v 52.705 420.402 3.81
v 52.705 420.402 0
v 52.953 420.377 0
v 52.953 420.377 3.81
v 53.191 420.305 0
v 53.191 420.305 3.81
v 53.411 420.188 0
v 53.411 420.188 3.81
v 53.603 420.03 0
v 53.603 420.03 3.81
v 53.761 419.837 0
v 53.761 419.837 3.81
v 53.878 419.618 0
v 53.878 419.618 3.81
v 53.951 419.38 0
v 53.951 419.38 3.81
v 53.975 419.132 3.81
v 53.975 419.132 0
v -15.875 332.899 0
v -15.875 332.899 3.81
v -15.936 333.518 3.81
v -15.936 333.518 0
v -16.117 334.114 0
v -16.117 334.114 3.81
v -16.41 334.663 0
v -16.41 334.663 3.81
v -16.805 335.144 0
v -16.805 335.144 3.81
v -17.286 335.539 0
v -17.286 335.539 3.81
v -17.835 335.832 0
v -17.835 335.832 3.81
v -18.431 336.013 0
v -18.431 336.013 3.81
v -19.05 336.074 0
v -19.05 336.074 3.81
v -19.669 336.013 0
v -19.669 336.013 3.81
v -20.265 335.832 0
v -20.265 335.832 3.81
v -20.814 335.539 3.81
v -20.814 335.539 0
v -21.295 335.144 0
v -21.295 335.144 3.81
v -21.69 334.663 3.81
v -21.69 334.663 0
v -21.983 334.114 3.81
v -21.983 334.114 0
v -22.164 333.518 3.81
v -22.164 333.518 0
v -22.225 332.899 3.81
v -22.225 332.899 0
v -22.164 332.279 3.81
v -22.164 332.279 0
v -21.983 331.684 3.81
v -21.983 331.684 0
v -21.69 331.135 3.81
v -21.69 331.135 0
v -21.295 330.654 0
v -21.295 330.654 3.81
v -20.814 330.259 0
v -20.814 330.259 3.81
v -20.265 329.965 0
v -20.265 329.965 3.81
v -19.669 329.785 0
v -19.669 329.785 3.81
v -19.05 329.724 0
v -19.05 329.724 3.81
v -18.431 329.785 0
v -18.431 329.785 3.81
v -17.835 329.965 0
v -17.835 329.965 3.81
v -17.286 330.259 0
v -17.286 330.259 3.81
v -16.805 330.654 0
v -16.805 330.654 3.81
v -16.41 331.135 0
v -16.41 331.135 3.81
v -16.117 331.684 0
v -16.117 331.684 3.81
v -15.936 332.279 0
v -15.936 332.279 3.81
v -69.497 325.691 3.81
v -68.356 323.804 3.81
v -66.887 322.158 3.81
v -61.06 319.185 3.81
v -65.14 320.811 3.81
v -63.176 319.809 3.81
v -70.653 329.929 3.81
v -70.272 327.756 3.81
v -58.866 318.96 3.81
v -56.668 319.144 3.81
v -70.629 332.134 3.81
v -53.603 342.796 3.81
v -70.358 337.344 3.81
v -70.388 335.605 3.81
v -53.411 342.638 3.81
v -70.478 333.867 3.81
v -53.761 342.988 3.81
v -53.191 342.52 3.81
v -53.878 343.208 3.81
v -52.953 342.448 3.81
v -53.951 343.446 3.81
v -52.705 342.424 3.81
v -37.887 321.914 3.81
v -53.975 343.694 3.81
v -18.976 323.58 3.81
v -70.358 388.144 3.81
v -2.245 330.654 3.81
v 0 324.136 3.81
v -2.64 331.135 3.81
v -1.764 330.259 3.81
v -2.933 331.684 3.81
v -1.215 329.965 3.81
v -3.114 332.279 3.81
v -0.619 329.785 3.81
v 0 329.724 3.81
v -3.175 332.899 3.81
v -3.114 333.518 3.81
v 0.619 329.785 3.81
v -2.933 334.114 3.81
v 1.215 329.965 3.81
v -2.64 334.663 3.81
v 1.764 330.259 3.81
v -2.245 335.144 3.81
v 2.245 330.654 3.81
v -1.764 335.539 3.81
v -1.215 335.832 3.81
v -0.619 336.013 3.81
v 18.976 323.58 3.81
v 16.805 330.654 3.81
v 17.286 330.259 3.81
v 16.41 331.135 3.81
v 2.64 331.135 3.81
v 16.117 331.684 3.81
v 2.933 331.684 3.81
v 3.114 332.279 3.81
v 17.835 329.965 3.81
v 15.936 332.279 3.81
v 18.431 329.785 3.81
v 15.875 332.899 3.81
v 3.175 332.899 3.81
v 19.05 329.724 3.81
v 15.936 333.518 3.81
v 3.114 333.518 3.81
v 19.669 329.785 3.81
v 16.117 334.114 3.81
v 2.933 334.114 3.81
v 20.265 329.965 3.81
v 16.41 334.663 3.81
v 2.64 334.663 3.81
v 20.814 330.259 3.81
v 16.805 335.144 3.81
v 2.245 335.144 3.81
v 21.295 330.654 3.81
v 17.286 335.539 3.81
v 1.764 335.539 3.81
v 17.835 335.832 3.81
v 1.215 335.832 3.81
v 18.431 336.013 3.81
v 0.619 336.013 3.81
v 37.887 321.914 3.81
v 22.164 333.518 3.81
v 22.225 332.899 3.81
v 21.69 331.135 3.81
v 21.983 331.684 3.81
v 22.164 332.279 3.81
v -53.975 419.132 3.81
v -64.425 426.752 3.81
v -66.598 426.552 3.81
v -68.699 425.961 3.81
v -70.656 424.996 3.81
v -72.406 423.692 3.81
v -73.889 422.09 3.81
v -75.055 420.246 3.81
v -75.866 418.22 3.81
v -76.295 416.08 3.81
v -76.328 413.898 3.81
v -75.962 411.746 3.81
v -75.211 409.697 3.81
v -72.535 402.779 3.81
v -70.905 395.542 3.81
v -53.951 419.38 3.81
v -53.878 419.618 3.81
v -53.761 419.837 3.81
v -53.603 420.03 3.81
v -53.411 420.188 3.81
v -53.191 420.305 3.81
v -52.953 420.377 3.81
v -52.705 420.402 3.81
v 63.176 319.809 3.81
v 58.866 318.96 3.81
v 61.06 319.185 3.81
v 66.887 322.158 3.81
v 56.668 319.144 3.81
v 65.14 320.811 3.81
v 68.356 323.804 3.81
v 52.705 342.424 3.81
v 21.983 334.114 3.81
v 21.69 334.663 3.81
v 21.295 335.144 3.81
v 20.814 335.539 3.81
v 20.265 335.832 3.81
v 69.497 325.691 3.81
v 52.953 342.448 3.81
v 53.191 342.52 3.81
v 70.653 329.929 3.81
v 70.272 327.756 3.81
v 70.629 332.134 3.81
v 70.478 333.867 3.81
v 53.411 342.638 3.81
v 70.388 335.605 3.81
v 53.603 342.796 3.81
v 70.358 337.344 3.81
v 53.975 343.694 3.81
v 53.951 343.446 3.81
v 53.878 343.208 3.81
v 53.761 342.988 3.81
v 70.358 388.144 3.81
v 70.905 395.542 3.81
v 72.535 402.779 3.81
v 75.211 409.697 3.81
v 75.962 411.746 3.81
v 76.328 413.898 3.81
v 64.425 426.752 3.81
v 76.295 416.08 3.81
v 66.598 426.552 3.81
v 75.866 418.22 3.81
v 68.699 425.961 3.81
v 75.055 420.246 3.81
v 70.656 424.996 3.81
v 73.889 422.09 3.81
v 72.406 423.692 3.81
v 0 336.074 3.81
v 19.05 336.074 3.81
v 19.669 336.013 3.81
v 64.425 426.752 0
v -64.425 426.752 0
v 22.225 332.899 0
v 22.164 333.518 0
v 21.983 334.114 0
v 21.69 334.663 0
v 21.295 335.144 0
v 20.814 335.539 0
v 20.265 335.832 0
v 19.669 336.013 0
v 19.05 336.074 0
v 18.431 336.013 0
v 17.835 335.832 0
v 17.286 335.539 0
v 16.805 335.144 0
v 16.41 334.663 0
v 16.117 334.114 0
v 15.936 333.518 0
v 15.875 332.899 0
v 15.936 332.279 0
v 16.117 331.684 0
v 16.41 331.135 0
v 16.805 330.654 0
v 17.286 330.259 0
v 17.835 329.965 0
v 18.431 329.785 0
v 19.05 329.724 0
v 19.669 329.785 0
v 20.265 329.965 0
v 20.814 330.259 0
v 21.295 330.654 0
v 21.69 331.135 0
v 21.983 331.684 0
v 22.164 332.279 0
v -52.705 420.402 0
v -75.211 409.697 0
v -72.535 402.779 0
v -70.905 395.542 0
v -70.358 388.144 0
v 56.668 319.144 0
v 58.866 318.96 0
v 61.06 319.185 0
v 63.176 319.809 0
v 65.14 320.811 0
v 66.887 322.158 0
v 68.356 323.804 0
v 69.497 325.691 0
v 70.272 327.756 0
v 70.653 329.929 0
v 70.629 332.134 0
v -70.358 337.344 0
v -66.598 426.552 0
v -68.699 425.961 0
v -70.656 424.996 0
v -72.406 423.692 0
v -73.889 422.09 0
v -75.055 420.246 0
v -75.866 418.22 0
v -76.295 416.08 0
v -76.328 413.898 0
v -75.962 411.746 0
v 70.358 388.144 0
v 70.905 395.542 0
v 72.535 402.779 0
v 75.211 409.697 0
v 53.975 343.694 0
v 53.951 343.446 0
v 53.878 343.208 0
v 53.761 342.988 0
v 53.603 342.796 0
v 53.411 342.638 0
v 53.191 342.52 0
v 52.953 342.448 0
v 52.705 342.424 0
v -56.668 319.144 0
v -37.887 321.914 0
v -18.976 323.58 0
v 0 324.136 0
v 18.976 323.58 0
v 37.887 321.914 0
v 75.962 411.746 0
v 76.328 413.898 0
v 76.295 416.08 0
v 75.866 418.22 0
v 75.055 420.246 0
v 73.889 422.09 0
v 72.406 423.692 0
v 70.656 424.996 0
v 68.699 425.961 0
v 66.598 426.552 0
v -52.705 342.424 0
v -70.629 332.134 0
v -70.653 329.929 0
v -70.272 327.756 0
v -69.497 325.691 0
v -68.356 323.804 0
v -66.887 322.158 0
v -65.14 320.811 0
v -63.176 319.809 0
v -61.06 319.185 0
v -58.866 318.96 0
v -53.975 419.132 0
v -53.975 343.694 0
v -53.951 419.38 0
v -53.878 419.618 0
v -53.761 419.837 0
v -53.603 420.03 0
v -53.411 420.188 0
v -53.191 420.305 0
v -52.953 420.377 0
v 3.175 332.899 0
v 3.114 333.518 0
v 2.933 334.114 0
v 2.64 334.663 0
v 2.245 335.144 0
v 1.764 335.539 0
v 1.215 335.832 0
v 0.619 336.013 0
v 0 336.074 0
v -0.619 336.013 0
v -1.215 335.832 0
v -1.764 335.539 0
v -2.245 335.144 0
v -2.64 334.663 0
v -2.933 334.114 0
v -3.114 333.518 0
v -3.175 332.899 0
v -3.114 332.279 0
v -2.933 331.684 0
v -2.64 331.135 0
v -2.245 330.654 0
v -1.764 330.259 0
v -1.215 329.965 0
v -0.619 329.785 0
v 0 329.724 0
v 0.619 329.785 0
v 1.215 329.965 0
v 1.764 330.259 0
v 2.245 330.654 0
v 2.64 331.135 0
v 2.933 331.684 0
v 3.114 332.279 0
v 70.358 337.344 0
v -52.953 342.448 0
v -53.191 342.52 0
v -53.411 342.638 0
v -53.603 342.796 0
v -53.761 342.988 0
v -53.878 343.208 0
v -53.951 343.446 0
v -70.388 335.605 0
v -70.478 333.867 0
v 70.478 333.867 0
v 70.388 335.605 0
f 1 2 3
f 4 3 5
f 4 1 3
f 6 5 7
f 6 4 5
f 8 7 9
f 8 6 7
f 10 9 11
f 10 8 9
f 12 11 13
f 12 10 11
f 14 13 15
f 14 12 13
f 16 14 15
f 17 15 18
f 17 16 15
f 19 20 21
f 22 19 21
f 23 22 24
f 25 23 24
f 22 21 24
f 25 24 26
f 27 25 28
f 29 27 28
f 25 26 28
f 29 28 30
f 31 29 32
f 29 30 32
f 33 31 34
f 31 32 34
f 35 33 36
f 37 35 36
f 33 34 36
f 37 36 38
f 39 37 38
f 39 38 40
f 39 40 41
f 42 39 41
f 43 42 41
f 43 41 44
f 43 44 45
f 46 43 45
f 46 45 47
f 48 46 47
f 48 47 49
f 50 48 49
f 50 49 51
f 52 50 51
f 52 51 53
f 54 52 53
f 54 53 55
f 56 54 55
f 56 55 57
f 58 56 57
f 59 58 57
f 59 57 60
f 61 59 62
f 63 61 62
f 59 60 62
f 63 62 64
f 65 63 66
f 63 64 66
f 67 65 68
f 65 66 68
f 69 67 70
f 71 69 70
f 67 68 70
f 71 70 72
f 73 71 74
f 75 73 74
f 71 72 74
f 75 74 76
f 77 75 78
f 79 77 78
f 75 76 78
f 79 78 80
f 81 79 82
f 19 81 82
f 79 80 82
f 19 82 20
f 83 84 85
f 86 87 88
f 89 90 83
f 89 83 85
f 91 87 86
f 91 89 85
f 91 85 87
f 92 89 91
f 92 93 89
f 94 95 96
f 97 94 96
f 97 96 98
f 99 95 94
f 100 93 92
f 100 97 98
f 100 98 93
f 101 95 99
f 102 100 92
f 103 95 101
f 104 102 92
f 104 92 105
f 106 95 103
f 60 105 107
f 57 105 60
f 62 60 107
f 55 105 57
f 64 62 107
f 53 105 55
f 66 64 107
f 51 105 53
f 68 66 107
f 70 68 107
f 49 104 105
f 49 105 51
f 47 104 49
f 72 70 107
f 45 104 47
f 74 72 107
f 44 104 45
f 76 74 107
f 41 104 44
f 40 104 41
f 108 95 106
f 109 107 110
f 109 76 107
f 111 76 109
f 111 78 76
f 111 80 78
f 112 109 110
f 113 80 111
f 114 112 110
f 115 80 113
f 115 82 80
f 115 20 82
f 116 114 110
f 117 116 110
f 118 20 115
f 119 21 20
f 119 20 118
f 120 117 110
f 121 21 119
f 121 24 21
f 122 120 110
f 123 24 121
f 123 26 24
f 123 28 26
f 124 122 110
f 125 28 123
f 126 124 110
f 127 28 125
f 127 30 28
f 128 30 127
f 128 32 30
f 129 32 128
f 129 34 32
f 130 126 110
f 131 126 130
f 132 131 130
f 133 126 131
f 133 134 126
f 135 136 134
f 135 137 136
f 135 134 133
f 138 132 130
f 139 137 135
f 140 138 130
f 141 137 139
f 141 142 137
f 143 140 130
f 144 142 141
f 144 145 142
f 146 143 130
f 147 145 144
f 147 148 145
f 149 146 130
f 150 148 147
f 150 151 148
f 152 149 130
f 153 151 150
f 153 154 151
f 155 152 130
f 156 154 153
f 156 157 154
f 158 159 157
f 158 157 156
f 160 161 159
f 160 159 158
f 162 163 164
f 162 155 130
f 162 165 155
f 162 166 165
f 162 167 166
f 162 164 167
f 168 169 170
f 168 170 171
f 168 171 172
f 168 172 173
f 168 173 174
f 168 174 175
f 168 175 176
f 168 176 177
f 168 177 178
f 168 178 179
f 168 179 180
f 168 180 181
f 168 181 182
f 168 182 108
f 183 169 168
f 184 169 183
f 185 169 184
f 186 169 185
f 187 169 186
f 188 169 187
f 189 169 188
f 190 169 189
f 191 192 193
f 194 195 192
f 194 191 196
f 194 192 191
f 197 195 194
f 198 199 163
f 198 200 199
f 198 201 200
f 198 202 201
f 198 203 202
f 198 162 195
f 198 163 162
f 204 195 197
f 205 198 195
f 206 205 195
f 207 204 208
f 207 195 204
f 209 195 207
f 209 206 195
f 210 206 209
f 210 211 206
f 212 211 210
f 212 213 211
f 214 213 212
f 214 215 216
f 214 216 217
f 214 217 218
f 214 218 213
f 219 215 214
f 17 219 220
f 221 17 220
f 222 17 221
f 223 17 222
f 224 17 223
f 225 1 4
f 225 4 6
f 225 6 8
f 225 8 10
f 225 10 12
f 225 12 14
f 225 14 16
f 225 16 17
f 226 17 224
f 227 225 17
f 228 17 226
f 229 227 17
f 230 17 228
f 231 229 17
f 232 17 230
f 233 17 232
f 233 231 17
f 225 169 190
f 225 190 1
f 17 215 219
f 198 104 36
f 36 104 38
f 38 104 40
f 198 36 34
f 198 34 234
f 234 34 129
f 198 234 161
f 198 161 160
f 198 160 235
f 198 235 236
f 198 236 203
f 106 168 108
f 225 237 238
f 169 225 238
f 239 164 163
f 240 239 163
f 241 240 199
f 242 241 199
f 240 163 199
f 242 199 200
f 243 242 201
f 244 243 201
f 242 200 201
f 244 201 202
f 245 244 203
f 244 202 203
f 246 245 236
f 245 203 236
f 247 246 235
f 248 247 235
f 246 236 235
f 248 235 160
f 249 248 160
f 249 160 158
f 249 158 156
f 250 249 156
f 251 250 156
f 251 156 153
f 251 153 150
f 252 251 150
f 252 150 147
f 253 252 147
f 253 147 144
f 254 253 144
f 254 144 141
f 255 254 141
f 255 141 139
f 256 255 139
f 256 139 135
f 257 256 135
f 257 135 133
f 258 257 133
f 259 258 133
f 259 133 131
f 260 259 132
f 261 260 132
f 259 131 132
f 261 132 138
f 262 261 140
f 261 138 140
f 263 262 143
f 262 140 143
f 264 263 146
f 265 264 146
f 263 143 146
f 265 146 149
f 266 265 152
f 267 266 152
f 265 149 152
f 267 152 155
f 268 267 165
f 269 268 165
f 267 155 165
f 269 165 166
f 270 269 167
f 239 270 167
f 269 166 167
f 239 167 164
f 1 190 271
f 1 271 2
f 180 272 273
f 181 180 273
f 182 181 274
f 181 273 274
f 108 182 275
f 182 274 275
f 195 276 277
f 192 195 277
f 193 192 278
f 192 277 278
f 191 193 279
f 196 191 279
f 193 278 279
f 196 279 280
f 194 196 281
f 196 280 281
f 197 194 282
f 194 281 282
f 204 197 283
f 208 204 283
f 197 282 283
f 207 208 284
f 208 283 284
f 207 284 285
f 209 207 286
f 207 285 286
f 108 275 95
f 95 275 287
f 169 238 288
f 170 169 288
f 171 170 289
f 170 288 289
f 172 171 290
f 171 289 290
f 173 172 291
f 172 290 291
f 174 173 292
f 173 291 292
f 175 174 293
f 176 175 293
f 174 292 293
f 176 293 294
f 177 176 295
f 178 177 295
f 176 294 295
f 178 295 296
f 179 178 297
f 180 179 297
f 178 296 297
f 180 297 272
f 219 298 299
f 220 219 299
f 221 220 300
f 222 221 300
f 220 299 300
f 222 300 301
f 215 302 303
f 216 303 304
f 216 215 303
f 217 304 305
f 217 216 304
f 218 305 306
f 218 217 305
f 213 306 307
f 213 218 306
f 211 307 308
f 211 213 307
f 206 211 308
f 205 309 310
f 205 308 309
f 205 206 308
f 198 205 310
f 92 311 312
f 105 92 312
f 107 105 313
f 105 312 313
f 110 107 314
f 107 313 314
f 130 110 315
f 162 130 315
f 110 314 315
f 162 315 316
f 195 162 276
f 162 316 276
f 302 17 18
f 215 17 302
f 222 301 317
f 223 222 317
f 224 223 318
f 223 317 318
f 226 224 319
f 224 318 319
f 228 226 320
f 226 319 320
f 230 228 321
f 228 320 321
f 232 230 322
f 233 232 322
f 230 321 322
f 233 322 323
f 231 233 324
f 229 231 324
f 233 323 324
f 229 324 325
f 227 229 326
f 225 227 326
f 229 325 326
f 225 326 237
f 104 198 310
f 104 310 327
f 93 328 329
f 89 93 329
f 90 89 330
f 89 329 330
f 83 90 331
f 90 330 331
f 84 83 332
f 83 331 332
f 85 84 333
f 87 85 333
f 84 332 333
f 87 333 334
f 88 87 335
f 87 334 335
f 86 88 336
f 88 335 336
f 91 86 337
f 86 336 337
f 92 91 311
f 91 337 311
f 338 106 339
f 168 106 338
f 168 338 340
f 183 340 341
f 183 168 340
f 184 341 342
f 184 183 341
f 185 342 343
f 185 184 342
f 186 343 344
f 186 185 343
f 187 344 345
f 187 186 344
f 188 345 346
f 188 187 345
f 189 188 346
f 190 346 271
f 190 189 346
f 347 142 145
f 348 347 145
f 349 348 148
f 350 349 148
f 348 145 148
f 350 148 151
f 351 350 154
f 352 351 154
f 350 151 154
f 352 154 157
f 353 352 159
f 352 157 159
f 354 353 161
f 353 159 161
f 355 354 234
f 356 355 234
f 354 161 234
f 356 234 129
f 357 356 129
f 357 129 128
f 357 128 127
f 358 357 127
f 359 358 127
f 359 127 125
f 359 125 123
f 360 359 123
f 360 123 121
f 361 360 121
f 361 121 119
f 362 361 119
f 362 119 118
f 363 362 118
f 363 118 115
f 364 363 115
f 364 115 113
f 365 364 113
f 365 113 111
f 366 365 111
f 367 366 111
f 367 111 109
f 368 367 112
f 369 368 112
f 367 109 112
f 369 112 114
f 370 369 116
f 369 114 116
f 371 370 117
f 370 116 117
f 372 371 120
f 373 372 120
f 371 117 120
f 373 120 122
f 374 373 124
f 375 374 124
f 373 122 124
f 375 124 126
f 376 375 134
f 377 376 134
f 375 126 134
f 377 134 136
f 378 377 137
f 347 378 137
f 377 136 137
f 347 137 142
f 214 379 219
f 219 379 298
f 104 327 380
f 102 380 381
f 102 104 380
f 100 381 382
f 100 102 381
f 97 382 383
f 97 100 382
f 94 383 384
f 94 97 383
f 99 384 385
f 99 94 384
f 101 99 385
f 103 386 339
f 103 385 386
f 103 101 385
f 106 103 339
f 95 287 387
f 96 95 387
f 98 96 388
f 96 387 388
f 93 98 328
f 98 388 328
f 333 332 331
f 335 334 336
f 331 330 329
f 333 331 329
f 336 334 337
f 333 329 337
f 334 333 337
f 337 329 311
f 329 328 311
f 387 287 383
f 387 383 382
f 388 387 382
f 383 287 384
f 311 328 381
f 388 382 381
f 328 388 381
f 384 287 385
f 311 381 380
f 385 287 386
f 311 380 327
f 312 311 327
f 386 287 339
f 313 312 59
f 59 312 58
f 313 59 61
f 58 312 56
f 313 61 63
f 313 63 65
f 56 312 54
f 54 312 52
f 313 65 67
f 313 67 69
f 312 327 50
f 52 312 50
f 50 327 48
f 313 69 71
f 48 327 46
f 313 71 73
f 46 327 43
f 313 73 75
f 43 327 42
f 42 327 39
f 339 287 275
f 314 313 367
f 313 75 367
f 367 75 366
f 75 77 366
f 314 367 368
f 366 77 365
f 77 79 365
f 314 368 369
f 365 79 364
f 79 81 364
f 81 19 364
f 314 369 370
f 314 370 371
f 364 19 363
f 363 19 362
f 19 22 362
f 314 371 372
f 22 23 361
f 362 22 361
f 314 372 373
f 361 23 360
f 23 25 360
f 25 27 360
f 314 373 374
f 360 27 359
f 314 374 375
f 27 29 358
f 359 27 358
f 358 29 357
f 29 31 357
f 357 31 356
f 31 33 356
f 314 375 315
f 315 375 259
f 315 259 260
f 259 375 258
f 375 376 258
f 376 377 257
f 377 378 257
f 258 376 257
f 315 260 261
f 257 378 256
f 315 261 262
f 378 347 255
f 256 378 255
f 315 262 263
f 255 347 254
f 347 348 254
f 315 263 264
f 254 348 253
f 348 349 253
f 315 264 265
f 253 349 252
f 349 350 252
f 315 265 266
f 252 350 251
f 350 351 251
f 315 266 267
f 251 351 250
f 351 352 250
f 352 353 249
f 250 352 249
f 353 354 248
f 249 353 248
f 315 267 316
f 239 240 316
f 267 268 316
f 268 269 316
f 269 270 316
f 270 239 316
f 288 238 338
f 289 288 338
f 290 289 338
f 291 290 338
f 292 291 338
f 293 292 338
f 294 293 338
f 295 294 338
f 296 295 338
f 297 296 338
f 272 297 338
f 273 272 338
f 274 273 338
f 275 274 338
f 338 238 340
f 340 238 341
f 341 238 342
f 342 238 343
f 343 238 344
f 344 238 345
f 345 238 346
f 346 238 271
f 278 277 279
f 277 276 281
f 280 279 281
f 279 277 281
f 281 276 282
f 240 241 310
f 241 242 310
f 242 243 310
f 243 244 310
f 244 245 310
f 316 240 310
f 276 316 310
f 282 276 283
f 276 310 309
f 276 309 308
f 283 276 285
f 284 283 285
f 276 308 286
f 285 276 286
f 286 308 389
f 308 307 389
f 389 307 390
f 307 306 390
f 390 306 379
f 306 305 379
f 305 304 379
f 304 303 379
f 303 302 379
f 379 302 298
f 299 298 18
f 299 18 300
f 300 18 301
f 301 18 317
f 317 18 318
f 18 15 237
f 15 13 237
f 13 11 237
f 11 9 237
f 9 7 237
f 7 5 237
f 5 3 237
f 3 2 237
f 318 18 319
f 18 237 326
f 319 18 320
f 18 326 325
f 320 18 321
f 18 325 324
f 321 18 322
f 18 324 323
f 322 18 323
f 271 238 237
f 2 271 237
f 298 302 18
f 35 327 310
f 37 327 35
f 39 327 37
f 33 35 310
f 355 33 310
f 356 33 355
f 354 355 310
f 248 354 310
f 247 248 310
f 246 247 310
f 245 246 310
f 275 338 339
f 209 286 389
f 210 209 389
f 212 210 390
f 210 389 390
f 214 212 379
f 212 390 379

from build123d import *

# Parameters (mm, degrees)
BOSS_EXTRUDE1_DEPTH = 3.81
SKETCH2_R           = 3.175
CUT_EXTRUDE1_DEPTH  = 434.546807932


with BuildPart() as part:
    # Sketch1 → Boss-Extrude1 (new body)
    with BuildSketch(Plane.XY):
        with BuildLine():
            Line((70.358, 337.34375), (70.358, 388.14375))
            ThreePointArc((70.358, 388.14375), (71.586192113, 399.190379334), (75.210780547, 409.697464286))
            ThreePointArc((75.210780547, 409.697464286), (74.514154695, 421.194879412), (64.424703202, 426.75175))
            Line((64.424703202, 426.75175), (-64.424703202, 426.75175))
            ThreePointArc((-64.424703202, 426.75175), (-74.514154695, 421.194879412), (-75.210780547, 409.697464286))
            ThreePointArc((-75.210780547, 409.697464286), (-71.586192113, 399.190379334), (-70.358, 388.14375))
            Line((-70.358, 388.14375), (-70.358, 337.34375))
            ThreePointArc((-70.358, 337.34375), (-70.425674666, 334.735607232), (-70.628516531, 332.134483679))
            ThreePointArc((-70.628516531, 332.134483679), (-66.887034969, 322.158291888), (-56.667646584, 319.143795582))
            ThreePointArc((-56.667646584, 319.143795582), (0, 324.13575), (56.667646584, 319.143795582))
            ThreePointArc((56.667646584, 319.143795582), (66.887034969, 322.158291888), (70.628516531, 332.134483679))
            ThreePointArc((70.628516531, 332.134483679), (70.425674666, 334.735607232), (70.358, 337.34375))
        make_face()
    extrude(amount=BOSS_EXTRUDE1_DEPTH)

    # Sketch2 → Cut-Extrude1 (cut, through all)
    with BuildSketch(Plane.XY.offset(3.81)):
        with Locations((-19.05, 332.89875)):
            Circle(SKETCH2_R)
        with Locations((0, 332.89875)):
            Circle(SKETCH2_R)
        with Locations((19.05, 332.89875)):
            Circle(SKETCH2_R)
        with BuildLine():
            Line((-52.705, 420.40175), (52.705, 420.40175))
            ThreePointArc((52.705, 420.40175), (53.603025612, 420.029775612), (53.975, 419.13175))
            Line((53.975, 419.13175), (53.975, 343.69375))
            ThreePointArc((53.975, 343.69375), (53.603025612, 342.795724388), (52.705, 342.42375))
            Line((52.705, 342.42375), (-52.705, 342.42375))
            ThreePointArc((-52.705, 342.42375), (-53.603025612, 342.795724388), (-53.975, 343.69375))
            Line((-53.975, 343.69375), (-53.975, 419.13175))
            ThreePointArc((-53.975, 419.13175), (-53.603025612, 420.029775612), (-52.705, 420.40175))
        make_face()
    extrude(amount=-CUT_EXTRUDE1_DEPTH, mode=Mode.SUBTRACT)


solid = part.part
